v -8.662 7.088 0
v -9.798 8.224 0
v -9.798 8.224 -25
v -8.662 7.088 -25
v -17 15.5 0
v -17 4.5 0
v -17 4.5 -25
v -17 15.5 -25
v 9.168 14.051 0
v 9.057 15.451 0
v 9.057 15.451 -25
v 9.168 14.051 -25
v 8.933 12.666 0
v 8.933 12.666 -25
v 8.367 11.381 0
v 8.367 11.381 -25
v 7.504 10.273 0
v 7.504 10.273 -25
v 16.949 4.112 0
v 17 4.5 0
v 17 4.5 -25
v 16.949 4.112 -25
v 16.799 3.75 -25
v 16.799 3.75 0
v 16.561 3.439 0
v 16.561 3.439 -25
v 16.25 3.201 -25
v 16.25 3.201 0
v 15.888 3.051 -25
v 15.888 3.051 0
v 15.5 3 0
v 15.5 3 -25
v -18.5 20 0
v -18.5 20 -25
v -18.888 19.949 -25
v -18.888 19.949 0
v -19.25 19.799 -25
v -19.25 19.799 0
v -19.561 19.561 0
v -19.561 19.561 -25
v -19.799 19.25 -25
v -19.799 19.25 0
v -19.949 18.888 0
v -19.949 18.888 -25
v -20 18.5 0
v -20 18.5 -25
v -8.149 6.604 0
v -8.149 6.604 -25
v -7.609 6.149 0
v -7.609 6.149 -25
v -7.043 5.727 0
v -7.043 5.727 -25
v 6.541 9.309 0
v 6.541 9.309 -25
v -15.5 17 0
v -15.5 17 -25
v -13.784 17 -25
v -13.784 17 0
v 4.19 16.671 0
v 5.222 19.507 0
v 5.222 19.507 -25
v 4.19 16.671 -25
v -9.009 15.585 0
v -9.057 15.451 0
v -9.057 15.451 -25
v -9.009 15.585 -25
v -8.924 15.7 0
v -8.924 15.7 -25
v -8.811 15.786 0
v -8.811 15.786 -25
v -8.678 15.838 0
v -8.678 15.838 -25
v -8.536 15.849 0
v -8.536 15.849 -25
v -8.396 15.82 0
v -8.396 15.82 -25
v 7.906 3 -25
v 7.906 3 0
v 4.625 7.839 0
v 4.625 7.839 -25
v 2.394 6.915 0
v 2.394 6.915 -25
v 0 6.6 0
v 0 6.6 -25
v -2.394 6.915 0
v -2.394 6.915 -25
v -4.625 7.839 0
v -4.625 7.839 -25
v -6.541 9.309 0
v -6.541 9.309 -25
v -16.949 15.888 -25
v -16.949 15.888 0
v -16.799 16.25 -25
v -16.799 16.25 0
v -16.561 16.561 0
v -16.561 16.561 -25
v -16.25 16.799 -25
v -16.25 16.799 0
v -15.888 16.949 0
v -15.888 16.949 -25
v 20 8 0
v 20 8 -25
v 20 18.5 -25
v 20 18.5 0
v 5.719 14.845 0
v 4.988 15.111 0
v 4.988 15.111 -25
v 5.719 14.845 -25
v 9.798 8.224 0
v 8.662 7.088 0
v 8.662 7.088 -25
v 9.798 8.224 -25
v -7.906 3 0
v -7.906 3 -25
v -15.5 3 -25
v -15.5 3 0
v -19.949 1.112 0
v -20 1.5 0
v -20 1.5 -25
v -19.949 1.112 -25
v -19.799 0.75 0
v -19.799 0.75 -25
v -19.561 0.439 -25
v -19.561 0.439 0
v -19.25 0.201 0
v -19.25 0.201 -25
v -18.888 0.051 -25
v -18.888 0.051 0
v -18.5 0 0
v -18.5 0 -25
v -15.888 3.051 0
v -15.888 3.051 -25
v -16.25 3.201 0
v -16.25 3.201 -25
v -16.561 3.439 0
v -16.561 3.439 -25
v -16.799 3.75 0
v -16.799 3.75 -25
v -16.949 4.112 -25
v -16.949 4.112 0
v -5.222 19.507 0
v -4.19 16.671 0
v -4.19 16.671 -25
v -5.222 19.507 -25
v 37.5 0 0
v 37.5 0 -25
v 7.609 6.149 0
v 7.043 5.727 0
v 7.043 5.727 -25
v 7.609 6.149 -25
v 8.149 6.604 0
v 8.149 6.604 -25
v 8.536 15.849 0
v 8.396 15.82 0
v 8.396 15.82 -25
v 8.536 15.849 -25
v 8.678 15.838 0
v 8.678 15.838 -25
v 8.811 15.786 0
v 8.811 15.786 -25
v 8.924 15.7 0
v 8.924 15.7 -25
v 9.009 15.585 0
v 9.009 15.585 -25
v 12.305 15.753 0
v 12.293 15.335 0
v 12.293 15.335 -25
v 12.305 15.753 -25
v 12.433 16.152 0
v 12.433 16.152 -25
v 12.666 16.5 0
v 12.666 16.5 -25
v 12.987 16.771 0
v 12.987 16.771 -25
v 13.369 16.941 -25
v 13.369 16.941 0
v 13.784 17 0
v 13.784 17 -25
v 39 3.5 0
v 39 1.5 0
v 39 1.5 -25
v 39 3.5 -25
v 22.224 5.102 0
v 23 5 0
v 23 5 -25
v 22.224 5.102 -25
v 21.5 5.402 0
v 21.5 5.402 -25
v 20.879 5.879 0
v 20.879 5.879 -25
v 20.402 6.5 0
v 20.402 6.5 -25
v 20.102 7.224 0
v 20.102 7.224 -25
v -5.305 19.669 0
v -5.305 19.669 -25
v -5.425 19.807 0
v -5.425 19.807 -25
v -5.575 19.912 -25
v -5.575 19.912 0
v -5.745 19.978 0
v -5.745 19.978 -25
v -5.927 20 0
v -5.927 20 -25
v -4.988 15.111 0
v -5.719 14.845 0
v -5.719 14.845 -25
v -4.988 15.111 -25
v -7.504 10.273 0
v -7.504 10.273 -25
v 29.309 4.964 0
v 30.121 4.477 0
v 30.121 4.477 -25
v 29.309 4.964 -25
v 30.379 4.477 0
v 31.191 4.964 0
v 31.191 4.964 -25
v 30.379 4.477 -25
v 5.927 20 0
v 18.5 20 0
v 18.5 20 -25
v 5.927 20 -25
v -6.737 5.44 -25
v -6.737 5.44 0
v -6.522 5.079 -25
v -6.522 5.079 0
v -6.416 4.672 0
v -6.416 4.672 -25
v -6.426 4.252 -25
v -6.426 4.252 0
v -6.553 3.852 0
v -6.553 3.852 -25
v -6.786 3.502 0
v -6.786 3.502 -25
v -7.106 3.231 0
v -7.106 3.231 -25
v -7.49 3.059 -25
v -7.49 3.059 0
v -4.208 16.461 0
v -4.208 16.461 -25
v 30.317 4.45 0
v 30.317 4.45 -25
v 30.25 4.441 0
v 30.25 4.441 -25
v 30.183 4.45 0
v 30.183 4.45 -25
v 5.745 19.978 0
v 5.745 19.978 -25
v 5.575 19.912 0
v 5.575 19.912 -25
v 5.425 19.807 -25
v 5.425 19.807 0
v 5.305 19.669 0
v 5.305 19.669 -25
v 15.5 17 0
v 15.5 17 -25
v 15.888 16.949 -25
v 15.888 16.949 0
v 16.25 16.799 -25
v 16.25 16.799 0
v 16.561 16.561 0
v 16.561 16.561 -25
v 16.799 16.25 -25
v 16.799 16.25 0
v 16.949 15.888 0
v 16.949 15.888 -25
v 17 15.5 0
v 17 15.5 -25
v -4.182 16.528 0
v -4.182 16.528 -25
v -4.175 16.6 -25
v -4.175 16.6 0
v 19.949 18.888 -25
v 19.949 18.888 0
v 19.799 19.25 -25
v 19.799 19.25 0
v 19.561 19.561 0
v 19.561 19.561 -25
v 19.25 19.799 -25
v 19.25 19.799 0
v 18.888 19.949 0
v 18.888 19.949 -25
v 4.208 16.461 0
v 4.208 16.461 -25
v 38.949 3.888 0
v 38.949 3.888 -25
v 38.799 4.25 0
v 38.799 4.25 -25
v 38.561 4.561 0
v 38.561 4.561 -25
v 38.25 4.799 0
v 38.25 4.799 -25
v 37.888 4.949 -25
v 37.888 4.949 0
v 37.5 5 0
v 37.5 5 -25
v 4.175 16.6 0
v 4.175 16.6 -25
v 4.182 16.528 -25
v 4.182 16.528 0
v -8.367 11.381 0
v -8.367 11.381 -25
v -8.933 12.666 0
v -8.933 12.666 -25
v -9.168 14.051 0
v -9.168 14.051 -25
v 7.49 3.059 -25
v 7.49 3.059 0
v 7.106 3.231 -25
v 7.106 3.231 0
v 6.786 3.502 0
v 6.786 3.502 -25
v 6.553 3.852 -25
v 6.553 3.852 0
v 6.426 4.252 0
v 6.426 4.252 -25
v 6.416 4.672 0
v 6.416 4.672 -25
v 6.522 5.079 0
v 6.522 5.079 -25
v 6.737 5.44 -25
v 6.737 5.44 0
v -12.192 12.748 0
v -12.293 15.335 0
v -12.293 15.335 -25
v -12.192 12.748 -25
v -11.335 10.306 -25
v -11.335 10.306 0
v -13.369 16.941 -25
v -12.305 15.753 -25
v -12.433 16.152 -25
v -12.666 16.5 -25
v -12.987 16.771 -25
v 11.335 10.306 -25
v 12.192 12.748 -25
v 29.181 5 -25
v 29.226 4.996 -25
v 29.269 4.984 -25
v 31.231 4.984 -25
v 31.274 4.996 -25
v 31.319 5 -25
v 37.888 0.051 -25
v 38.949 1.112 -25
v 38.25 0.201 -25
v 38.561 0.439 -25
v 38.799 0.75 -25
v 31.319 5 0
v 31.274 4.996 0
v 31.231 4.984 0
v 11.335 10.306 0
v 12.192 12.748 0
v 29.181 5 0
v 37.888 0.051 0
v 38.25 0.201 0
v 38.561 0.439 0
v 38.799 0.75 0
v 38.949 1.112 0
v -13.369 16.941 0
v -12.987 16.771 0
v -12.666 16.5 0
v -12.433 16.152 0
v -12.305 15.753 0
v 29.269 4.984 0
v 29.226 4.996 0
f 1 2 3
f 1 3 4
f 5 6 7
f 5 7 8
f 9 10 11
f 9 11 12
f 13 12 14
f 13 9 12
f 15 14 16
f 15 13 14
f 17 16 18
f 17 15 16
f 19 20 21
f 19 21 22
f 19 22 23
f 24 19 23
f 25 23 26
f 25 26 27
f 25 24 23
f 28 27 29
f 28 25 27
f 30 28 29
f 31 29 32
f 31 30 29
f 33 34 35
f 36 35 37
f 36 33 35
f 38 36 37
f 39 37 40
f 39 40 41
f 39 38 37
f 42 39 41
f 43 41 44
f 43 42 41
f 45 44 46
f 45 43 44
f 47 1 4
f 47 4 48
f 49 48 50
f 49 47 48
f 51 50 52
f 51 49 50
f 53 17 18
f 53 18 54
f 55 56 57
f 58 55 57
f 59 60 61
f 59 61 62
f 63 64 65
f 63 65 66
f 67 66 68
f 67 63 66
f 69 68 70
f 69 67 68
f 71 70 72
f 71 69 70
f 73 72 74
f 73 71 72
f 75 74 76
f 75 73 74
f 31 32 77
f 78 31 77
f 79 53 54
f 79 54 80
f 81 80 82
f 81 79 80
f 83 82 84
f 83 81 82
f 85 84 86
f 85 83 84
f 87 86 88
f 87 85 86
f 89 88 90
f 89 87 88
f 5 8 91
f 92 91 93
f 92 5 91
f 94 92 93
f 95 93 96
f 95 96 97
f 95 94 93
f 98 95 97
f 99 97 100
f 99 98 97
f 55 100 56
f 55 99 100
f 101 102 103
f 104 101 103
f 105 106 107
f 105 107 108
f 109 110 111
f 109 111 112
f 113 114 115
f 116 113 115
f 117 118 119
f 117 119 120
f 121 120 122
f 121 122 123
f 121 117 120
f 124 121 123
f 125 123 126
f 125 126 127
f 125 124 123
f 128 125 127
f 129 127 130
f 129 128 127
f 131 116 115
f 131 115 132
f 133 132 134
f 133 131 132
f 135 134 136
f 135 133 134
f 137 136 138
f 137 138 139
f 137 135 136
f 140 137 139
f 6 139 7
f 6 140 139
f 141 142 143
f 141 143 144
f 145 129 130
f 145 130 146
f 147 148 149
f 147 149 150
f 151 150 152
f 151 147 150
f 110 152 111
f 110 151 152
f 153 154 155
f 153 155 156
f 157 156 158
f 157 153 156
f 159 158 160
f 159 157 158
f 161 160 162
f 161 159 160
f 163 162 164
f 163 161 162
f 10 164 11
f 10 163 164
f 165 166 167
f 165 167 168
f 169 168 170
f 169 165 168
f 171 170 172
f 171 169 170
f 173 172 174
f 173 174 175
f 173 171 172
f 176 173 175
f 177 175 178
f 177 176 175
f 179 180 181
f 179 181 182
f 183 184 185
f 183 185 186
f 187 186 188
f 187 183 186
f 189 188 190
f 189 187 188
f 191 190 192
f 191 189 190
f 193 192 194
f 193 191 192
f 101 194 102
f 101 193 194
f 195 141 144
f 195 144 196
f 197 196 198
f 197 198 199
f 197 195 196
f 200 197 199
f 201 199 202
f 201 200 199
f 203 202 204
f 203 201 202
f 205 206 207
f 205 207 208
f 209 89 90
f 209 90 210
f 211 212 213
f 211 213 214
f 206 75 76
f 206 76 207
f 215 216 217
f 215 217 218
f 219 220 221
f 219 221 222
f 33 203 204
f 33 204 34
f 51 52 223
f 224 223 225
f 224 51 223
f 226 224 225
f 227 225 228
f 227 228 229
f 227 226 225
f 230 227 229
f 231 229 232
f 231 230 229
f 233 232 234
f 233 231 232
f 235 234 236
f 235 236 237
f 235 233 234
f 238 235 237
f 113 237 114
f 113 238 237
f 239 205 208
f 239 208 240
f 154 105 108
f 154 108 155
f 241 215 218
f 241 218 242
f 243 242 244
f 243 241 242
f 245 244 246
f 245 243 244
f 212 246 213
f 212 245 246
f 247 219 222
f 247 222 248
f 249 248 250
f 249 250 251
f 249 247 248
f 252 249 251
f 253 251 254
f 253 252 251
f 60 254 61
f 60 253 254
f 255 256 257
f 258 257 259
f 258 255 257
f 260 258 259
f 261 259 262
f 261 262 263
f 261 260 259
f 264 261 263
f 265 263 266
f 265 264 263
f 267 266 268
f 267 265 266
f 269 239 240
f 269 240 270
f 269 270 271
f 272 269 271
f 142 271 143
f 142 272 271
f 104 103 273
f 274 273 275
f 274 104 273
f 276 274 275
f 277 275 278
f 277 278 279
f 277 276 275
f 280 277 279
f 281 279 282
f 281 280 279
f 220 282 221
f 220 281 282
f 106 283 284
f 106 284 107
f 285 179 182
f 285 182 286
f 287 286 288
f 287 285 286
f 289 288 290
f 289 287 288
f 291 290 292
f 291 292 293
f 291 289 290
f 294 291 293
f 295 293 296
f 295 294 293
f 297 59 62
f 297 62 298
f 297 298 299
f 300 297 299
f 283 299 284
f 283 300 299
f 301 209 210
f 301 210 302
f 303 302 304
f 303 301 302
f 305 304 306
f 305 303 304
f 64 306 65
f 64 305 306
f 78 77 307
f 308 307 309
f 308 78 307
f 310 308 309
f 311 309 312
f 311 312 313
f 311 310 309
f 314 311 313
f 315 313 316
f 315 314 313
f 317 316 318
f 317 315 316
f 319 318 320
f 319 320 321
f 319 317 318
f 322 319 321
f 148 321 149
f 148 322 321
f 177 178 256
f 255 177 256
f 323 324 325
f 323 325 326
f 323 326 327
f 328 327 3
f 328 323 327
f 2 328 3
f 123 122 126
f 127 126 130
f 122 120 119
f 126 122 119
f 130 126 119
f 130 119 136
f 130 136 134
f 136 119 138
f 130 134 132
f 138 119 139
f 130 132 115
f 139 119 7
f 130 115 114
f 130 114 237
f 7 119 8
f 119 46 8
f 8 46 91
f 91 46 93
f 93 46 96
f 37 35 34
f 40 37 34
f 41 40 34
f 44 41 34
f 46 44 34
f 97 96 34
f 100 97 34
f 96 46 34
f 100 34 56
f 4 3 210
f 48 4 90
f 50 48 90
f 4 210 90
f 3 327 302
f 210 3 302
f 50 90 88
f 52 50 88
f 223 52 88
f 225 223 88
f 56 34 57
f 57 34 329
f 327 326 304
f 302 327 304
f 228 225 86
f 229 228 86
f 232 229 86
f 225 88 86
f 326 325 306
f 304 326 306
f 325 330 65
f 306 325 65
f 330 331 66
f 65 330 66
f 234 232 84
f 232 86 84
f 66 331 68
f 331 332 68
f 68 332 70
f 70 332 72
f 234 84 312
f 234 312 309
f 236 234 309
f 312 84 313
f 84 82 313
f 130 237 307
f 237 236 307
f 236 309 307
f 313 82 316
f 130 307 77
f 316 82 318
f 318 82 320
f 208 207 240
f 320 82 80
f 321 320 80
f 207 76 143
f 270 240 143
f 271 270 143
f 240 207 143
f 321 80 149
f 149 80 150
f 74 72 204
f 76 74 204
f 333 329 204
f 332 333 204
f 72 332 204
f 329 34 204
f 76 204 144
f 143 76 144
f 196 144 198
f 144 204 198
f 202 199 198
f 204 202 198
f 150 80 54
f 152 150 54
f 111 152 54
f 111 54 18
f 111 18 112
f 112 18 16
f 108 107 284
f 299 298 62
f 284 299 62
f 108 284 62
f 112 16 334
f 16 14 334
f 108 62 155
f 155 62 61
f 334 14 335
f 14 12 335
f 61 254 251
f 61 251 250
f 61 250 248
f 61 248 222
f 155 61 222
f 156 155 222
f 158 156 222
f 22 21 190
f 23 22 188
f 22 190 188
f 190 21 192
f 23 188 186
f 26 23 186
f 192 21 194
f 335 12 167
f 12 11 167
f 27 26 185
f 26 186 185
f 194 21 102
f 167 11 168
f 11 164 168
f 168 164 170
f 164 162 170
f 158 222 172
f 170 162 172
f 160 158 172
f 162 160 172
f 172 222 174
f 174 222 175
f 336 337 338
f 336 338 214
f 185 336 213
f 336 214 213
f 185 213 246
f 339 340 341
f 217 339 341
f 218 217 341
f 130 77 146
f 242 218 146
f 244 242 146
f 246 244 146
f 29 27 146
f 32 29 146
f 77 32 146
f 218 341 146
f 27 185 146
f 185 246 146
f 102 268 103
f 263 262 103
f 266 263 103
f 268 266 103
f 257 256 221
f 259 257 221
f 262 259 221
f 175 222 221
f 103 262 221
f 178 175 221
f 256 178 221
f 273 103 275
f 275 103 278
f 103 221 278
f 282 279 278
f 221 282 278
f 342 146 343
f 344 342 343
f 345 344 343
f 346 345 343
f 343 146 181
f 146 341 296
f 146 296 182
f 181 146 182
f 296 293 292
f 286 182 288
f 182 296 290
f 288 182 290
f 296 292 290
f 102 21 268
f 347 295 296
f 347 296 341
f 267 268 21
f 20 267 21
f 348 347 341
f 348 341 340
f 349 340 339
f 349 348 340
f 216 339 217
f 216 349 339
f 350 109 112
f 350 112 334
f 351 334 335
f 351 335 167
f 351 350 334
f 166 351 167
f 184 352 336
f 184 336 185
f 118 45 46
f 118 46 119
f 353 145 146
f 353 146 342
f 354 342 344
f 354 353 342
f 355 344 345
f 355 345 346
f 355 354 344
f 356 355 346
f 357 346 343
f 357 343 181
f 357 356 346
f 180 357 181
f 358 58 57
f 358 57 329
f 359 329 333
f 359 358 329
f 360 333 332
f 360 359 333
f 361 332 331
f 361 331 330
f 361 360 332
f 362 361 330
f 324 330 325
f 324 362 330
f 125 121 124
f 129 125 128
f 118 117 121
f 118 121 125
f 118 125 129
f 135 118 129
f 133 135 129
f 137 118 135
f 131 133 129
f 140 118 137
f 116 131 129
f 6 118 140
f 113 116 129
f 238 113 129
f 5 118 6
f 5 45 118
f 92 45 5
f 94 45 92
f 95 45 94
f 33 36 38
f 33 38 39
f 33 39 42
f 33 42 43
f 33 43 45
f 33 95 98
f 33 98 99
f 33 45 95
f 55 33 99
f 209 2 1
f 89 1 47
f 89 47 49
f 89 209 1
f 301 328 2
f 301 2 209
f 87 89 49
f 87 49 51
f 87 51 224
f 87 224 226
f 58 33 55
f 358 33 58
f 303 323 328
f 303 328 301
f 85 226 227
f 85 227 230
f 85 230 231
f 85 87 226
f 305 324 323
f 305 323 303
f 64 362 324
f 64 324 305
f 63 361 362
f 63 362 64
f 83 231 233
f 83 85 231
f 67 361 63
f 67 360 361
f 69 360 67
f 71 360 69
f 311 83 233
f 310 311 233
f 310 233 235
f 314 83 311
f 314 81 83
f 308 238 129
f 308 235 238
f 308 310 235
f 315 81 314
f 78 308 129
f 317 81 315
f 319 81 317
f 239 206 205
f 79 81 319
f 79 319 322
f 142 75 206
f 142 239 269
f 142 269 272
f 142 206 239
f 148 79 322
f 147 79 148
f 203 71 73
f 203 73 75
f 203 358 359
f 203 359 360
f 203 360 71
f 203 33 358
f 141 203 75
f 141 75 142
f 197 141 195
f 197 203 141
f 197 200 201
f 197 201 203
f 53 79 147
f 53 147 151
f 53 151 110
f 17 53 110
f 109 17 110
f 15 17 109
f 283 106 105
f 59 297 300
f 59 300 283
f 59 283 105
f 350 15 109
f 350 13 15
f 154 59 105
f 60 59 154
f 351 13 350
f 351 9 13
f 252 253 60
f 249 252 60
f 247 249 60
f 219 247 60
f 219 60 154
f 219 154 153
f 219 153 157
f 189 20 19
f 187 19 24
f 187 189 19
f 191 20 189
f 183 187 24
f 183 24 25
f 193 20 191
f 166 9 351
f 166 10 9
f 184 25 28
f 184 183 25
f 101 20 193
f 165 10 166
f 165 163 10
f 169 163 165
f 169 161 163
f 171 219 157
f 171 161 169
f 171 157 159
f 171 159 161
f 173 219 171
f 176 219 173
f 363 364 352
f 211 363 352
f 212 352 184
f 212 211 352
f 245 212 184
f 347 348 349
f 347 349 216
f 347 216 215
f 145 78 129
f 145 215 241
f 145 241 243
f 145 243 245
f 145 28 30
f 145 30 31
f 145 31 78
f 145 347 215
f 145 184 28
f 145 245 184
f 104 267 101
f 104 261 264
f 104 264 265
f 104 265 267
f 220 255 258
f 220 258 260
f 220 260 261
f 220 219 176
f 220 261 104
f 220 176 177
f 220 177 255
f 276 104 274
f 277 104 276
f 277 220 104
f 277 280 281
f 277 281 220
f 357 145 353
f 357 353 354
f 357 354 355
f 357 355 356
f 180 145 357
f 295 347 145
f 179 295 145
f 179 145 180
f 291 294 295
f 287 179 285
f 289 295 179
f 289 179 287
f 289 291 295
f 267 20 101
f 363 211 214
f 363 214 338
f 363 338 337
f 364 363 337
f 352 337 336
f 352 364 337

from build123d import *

# Parameters (mm, degrees)
MAIN_EXTRUSION_DEPTH = 25


with BuildPart() as part:
    # Sk Main Extrusion → Main Extrusion (new body)
    with BuildSketch(Plane.XY):
        with BuildLine():
            Line((-4.190076845, 16.671180212), (-5.222054351, 19.506515107))
            ThreePointArc((-5.222054351, 19.506515107), (-5.496641489, 19.864364033), (-5.926823816, 20))
            Line((-5.926823816, 20), (-18.5, 20))
            ThreePointArc((-18.5, 20), (-19.560660172, 19.560660172), (-20, 18.5))
            Line((-20, 18.5), (-20, 1.5))
            ThreePointArc((-20, 1.5), (-19.560660172, 0.439339828), (-18.5, 0))
            Line((-18.5, 0), (37.5, 0))
            ThreePointArc((37.5, 0), (38.560660172, 0.439339828), (39, 1.5))
            Line((39, 1.5), (39, 3.5))
            ThreePointArc((39, 3.5), (38.560660172, 4.560660172), (37.5, 5))
            Line((37.5, 5), (31.319331136, 5))
            ThreePointArc((31.319331136, 5), (31.252521542, 4.990907613), (31.190571617, 4.964291825))
            Line((31.190571617, 4.964291825), (30.378759519, 4.476505905))
            ThreePointArc((30.378759519, 4.476505905), (30.25, 4.44079773), (30.121240481, 4.476505905))
            Line((30.121240481, 4.476505905), (29.309428383, 4.964291825))
            ThreePointArc((29.309428383, 4.964291825), (29.247478458, 4.990907613), (29.180668864, 5))
            Line((29.180668864, 5), (23, 5))
            ThreePointArc((23, 5), (20.878679656, 5.878679656), (20, 8))
            Line((20, 8), (20, 18.5))
            ThreePointArc((20, 18.5), (19.560660172, 19.560660172), (18.5, 20))
            Line((18.5, 20), (5.926823816, 20))
            ThreePointArc((5.926823816, 20), (5.496641489, 19.864364033), (5.222054351, 19.506515107))
            Line((5.222054351, 19.506515107), (4.190076845, 16.671180212))
            ThreePointArc((4.190076845, 16.671180212), (4.175951325, 16.563886241), (4.208493649, 16.460675177))
            Line((4.208493649, 16.460675177), (4.987558066, 15.111296024))
            Line((4.987558066, 15.111296024), (5.718509166, 14.845251581))
            Line((5.718509166, 14.845251581), (8.396186179, 15.81984631))
            ThreePointArc((8.396186179, 15.81984631), (8.811074612, 15.786489799), (9.056960151, 15.450654467))
            ThreePointArc((9.056960151, 15.450654467), (8.933433013, 12.665882372), (7.504160339, 10.272684887))
            Line((7.504160339, 10.272684887), (6.540737726, 9.309262274))
            ThreePointArc((6.540737726, 9.309262274), (0, 6.6), (-6.540737726, 9.309262274))
            Line((-6.540737726, 9.309262274), (-7.504160339, 10.272684887))
            ThreePointArc((-7.504160339, 10.272684887), (-8.933433013, 12.665882372), (-9.056960151, 15.450654467))
            ThreePointArc((-9.056960151, 15.450654467), (-8.811074612, 15.786489799), (-8.396186179, 15.81984631))
            Line((-8.396186179, 15.81984631), (-5.718509166, 14.845251581))
            Line((-5.718509166, 14.845251581), (-4.987558066, 15.111296024))
            Line((-4.987558066, 15.111296024), (-4.208493649, 16.460675177))
            ThreePointArc((-4.208493649, 16.460675177), (-4.175951325, 16.563886241), (-4.190076845, 16.671180212))
        make_face()
        with BuildLine():
            Line((-9.797835979, 8.22371984), (-8.66205807, 7.08794193))
            ThreePointArc((-8.66205807, 7.08794193), (-7.88207258, 6.372610607), (-7.043254789, 5.727272727))
            ThreePointArc((-7.043254789, 5.727272727), (-6.475500267, 4.047732983), (-7.90569415, 3))
            Line((-7.90569415, 3), (-15.5, 3))
            ThreePointArc((-15.5, 3), (-16.560660172, 3.439339828), (-17, 4.5))
            Line((-17, 4.5), (-17, 15.5))
            ThreePointArc((-17, 15.5), (-16.560660172, 16.560660172), (-15.5, 17))
            Line((-15.5, 17), (-13.783837598, 17))
            ThreePointArc((-13.783837598, 17), (-12.666241809, 16.500489706), (-12.292980155, 15.334639535))
            ThreePointArc((-12.292980155, 15.334639535), (-11.855296302, 11.494998738), (-9.797835979, 8.22371984))
        make_face(mode=Mode.SUBTRACT)
        with BuildLine():
            Line((17, 15.5), (17, 4.5))
            ThreePointArc((17, 4.5), (16.560660172, 3.439339828), (15.5, 3))
            Line((15.5, 3), (7.90569415, 3))
            ThreePointArc((7.90569415, 3), (6.475500267, 4.047732983), (7.043254789, 5.727272727))
            ThreePointArc((7.043254789, 5.727272727), (7.88207258, 6.372610607), (8.66205807, 7.08794193))
            Line((8.66205807, 7.08794193), (9.797835979, 8.22371984))
            ThreePointArc((9.797835979, 8.22371984), (11.855296302, 11.494998738), (12.292980155, 15.334639535))
            ThreePointArc((12.292980155, 15.334639535), (12.666241809, 16.500489706), (13.783837598, 17))
            Line((13.783837598, 17), (15.5, 17))
            ThreePointArc((15.5, 17), (16.560660172, 16.560660172), (17, 15.5))
        make_face(mode=Mode.SUBTRACT)
    extrude(amount=-MAIN_EXTRUSION_DEPTH)


solid = part.part
